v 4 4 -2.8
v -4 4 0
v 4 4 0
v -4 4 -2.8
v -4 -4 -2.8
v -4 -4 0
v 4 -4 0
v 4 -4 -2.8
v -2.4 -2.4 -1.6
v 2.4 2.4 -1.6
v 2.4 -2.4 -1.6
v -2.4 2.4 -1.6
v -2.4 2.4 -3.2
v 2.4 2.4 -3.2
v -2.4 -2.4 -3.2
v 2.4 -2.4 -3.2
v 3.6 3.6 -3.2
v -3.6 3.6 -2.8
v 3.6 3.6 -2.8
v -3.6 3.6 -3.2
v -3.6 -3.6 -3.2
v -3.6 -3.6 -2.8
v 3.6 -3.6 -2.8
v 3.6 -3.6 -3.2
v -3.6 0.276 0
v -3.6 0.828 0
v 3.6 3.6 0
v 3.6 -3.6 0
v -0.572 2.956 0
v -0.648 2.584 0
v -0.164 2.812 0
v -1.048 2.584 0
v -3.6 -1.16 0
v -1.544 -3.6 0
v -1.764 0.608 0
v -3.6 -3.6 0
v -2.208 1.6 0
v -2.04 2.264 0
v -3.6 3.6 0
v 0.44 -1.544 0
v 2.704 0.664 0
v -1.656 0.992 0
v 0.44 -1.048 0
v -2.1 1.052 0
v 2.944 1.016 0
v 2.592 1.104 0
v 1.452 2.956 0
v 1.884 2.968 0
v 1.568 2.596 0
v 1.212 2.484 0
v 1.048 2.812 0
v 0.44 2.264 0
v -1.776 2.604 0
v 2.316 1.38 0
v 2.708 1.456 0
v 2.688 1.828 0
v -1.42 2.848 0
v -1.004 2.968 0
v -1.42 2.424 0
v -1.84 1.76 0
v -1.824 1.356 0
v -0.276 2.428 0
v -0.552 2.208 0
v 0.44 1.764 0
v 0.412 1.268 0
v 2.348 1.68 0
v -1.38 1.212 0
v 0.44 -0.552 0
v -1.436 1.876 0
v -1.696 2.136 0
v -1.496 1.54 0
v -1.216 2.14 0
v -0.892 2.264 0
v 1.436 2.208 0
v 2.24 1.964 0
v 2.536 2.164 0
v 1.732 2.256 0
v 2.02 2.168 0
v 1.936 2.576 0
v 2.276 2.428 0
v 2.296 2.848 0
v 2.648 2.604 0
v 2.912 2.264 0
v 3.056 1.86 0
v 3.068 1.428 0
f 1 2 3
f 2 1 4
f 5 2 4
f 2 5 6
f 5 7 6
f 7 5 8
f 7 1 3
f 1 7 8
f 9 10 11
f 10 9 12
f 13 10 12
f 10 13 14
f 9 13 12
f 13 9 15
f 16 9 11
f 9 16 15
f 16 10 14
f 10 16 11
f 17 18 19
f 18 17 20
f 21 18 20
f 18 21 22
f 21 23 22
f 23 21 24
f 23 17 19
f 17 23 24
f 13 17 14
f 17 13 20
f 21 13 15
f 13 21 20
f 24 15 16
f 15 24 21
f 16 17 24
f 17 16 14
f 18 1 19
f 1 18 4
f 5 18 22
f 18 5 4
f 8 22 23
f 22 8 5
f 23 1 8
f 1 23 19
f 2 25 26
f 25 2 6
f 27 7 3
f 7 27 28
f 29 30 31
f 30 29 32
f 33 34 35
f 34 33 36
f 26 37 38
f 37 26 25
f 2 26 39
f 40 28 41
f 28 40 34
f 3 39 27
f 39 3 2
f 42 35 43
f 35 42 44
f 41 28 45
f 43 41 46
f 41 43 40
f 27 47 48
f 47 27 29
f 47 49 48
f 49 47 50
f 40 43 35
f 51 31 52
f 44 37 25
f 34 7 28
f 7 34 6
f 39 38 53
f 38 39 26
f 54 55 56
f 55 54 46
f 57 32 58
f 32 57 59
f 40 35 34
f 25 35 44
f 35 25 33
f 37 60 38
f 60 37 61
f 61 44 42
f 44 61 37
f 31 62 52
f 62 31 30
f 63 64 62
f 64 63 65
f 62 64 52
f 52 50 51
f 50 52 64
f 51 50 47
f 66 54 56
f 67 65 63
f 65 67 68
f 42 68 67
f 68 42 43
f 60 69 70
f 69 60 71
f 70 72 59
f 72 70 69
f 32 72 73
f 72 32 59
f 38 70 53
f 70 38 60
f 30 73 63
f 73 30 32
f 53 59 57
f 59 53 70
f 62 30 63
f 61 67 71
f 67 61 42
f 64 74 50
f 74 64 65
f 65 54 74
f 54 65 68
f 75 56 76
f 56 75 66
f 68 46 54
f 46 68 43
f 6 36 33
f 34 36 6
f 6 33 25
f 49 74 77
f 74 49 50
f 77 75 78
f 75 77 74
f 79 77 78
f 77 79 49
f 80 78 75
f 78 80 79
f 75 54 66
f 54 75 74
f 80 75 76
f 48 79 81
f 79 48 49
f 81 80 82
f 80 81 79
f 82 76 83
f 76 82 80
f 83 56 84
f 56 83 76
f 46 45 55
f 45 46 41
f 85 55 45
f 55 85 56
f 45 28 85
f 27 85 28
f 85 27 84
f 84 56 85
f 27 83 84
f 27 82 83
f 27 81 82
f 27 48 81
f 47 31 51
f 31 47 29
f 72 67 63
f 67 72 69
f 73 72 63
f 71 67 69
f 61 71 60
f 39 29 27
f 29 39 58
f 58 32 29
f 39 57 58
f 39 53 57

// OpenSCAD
// file: ../p/box5.scad
use <../lib.scad>
function ldraw_lib__box5() = [
// 0 Box with 5 Faces and All Edges
// 0 Name: box5.dat
// 0 Author: James Jessiman
// 0 !LDRAW_ORG Primitive UPDATE 2012-01
// 0 !LICENSE Licensed under CC BY 2.0 and CC BY 4.0 : see CAreadme.txt
// 
// 0 BFC CERTIFY CCW
  [0,"BFC","CERTIFY"],
  [0,"BFC","CCW"],
// 
// 0 !HISTORY 2002-04-03 [sbliss] Modified for BFC compliance
// 0 !HISTORY 2002-04-25 [PTadmin] Official Update 2002-02
// 0 !HISTORY 2007-06-24 [PTadmin] Header formatted for Contributor Agreement
// 0 !HISTORY 2008-07-01 [PTadmin] Official Update 2008-01
// 0 !HISTORY 2012-02-16 [Philo] Changed to CCW
// 0 !HISTORY 2012-03-30 [PTadmin] Official Update 2012-01
// 
// 
// 2 24 1 1 1 -1 1 1
  [2,24,1,1,1,-1,1,1],
// 2 24 -1 1 1 -1 1 -1
  [2,24,-1,1,1,-1,1,-1],
// 2 24 -1 1 -1 1 1 -1
  [2,24,-1,1,-1,1,1,-1],
// 2 24 1 1 -1 1 1 1
  [2,24,1,1,-1,1,1,1],
// 2 24 1 0 1 -1 0 1
  [2,24,1,0,1,-1,0,1],
// 2 24 -1 0 1 -1 0 -1
  [2,24,-1,0,1,-1,0,-1],
// 2 24 -1 0 -1 1 0 -1
  [2,24,-1,0,-1,1,0,-1],
// 2 24 1 0 -1 1 0 1
  [2,24,1,0,-1,1,0,1],
// 2 24 1 0 1 1 1 1
  [2,24,1,0,1,1,1,1],
// 2 24 -1 0 1 -1 1 1
  [2,24,-1,0,1,-1,1,1],
// 2 24 1 0 -1 1 1 -1
  [2,24,1,0,-1,1,1,-1],
// 2 24 -1 0 -1 -1 1 -1
  [2,24,-1,0,-1,-1,1,-1],
// 4 16 -1 1 1 1 1 1 1 1 -1 -1 1 -1
  [4,16,-1,1,1,1,1,1,1,1,-1,-1,1,-1],
// 4 16 -1 1 1 -1 0 1 1 0 1 1 1 1
  [4,16,-1,1,1,-1,0,1,1,0,1,1,1,1],
// 4 16 -1 1 -1 -1 0 -1 -1 0 1 -1 1 1
  [4,16,-1,1,-1,-1,0,-1,-1,0,1,-1,1,1],
// 4 16 1 1 -1 1 0 -1 -1 0 -1 -1 1 -1
  [4,16,1,1,-1,1,0,-1,-1,0,-1,-1,1,-1],
// 4 16 1 1 1 1 0 1 1 0 -1 1 1 -1
  [4,16,1,1,1,1,0,1,1,0,-1,1,1,-1],
];
module ldraw_lib__box5(step=0, col=false, unit=2/5, alt=false, line=0.2, solid=!$preview)
    makepoly(ldraw_lib__box5(), step=step, col=col, unit=unit, alt=alt, line=line, solid=solid);
ldraw_lib__box5(line=0.2);
// file: ../p/box4.scad
use <../lib.scad>
function ldraw_lib__box4() = [
// 0 Box with 4 Faces (2 Parallel Pairs) and All Edges
// 0 Name: box4.dat
// 0 Author: James Jessiman
// 0 !LDRAW_ORG Primitive UPDATE 2012-01
// 0 !LICENSE Licensed under CC BY 2.0 and CC BY 4.0 : see CAreadme.txt
// 
// 0 BFC CERTIFY CCW
  [0,"BFC","CERTIFY"],
  [0,"BFC","CCW"],
// 
// 0 !HISTORY 2002-04-03 [sbliss] Modified for BFC compliance
// 0 !HISTORY 2002-04-25 [PTadmin] Official Update 2002-02
// 0 !HISTORY 2007-06-24 [PTadmin] Header formatted for Contributor Agreement
// 0 !HISTORY 2008-07-01 [PTadmin] Official Update 2008-01
// 0 !HISTORY 2012-02-16 [Philo] Changed to CCW
// 0 !HISTORY 2012-03-30 [PTadmin] Official Update 2012-01
// 
// 
// 2 24 1 1 1 -1 1 1
  [2,24,1,1,1,-1,1,1],
// 2 24 -1 1 1 -1 1 -1
  [2,24,-1,1,1,-1,1,-1],
// 2 24 -1 1 -1 1 1 -1
  [2,24,-1,1,-1,1,1,-1],
// 2 24 1 1 -1 1 1 1
  [2,24,1,1,-1,1,1,1],
// 2 24 1 0 1 -1 0 1
  [2,24,1,0,1,-1,0,1],
// 2 24 -1 0 1 -1 0 -1
  [2,24,-1,0,1,-1,0,-1],
// 2 24 -1 0 -1 1 0 -1
  [2,24,-1,0,-1,1,0,-1],
// 2 24 1 0 -1 1 0 1
  [2,24,1,0,-1,1,0,1],
// 2 24 1 0 1 1 1 1
  [2,24,1,0,1,1,1,1],
// 2 24 -1 0 1 -1 1 1
  [2,24,-1,0,1,-1,1,1],
// 2 24 1 0 -1 1 1 -1
  [2,24,1,0,-1,1,1,-1],
// 2 24 -1 0 -1 -1 1 -1
  [2,24,-1,0,-1,-1,1,-1],
// 4 16 -1 1 1 -1 0 1 1 0 1 1 1 1
  [4,16,-1,1,1,-1,0,1,1,0,1,1,1,1],
// 4 16 -1 1 -1 -1 0 -1 -1 0 1 -1 1 1
  [4,16,-1,1,-1,-1,0,-1,-1,0,1,-1,1,1],
// 4 16 1 1 -1 1 0 -1 -1 0 -1 -1 1 -1
  [4,16,1,1,-1,1,0,-1,-1,0,-1,-1,1,-1],
// 4 16 1 1 1 1 0 1 1 0 -1 1 1 -1
  [4,16,1,1,1,1,0,1,1,0,-1,1,1,-1],
];
module ldraw_lib__box4(step=0, col=false, unit=2/5, alt=false, line=0.2, solid=!$preview)
    makepoly(ldraw_lib__box4(), step=step, col=col, unit=unit, alt=alt, line=line, solid=solid);
ldraw_lib__box4(line=0.2);
// file: s/3070bs01.scad
use <../../lib.scad>
use <../../p/box4.scad>
use <../../p/box5.scad>
function ldraw_lib__s__3070bs01() = [
// 0 ~Tile  1 x  1 with Groove without Top Face
// 0 Name: s\3070bs01.dat
// 0 Author: Chris Dee [cwdee]
// 0 !LDRAW_ORG Subpart UPDATE 2009-02
// 0 !LICENSE Licensed under CC BY 2.0 and CC BY 4.0 : see CAreadme.txt
// 
// 0 BFC CERTIFY CCW
  [0,"BFC","CERTIFY"],
  [0,"BFC","CCW"],
// 
// 0 !HISTORY 2009-09-03 [PTadmin] Official Update 2009-02
// 
// 
// 1 16 0 0 0 10 0 0 0 7 0 0 0 10 box4.dat
  [1,16,0,0,0,10,0,0,0,7,0,0,0,10, ldraw_lib__box4()],
// 0 BFC INVERTNEXT
  [0,"BFC","INVERTNEXT"],
// 1 16 0 8 0 6 0 0 0 -4 0 0 0 6 box5.dat
  [1,16,0,8,0,6,0,0,0,-4,0,0,0,6, ldraw_lib__box5()],
// 1 16 0 7 0 9 0 0 0 1 0 0 0 9 box4.dat
  [1,16,0,7,0,9,0,0,0,1,0,0,0,9, ldraw_lib__box4()],
// 
// 4 16 9 8 9 6 8 6 -6 8 6 -9 8 9
  [4,16,9,8,9,6,8,6,-6,8,6,-9,8,9],
// 4 16 -9 8 9 -6 8 6 -6 8 -6 -9 8 -9
  [4,16,-9,8,9,-6,8,6,-6,8,-6,-9,8,-9],
// 4 16 -9 8 -9 -6 8 -6 6 8 -6 9 8 -9
  [4,16,-9,8,-9,-6,8,-6,6,8,-6,9,8,-9],
// 4 16 9 8 -9 6 8 -6 6 8 6 9 8 9
  [4,16,9,8,-9,6,8,-6,6,8,6,9,8,9],
// 
// 4 16 10 7 10 9 7 9 -9 7 9 -10 7 10
  [4,16,10,7,10,9,7,9,-9,7,9,-10,7,10],
// 4 16 -10 7 10 -9 7 9 -9 7 -9 -10 7 -10
  [4,16,-10,7,10,-9,7,9,-9,7,-9,-10,7,-10],
// 4 16 -10 7 -10 -9 7 -9 9 7 -9 10 7 -10
  [4,16,-10,7,-10,-9,7,-9,9,7,-9,10,7,-10],
// 4 16 10 7 -10 9 7 -9 9 7 9 10 7 10
  [4,16,10,7,-10,9,7,-9,9,7,9,10,7,10],
// 0
];
module ldraw_lib__s__3070bs01(step=0, col=false, unit=2/5, alt=false, line=0.2, solid=!$preview)
    makepoly(ldraw_lib__s__3070bs01(), step=step, col=col, unit=unit, alt=alt, line=line, solid=solid);
ldraw_lib__s__3070bs01(line=0.2);
// main file
use <../lib.scad>
use <s/3070bs01.scad>
function ldraw_lib__3070bp0r() = [
// 0 Tile  1 x  1 with Magenta Heart Frame on Yellow Background Pattern
// 0 Name: 3070bp0r.dat
// 0 Author: Philippe Hurbain [Philo]
// 0 !LDRAW_ORG Part UPDATE 2020-03
// 0 !LICENSE Licensed under CC BY 2.0 and CC BY 4.0 : see CAreadme.txt
// 
// 0 BFC CERTIFY CCW
  [0,"BFC","CERTIFY"],
  [0,"BFC","CCW"],
// 
// 0 !KEYWORDS Bricklink 3070bpb159, Dots, Set 41916
// 
// 0 !HISTORY 2020-12-29 [PTadmin] Official Update 2020-03
// 
// 
// 1 16 0 0 0 1 0 0 0 1 0 0 0 1 s\3070bs01.dat
  [1,16,0,0,0,1,0,0,0,1,0,0,0,1, ldraw_lib__s__3070bs01()],
// 4 16 -10 0 10 -10 0 -10 -9 0 0.69 -9 0 2.07
  [4,16,-10,0,10,-10,0,-10,-9,0,0.69,-9,0,2.07],
// 4 16 9 0 9 9 0 -9 10 0 -10 10 0 10
  [4,16,9,0,9,9,0,-9,10,0,-10,10,0,10],
// 4 26 -0.41 0 7.03 -1.43 0 7.39 -2.62 0 6.46 -1.62 0 6.46
  [4,26,-0.41,0,7.03,-1.43,0,7.39,-2.62,0,6.46,-1.62,0,6.46],
// 4 353 -4.41 0 1.52 -9 0 -2.9 -9 0 -9 -3.86 0 -9
  [4,353,-4.41,0,1.52,-9,0,-2.9,-9,0,-9,-3.86,0,-9],
// 4 353 -5.52 0 4 -5.1 0 5.66 -9 0 2.07 -9 0 0.69
  [4,353,-5.52,0,4,-5.1,0,5.66,-9,0,2.07,-9,0,0.69],
// 3 16 -10 0 10 -9 0 2.07 -9 0 9
  [3,16,-10,0,10,-9,0,2.07,-9,0,9],
// 4 14 9 0 -9 6.76 0 1.66 1.1 0 -3.86 -3.86 0 -9
  [4,14,9,0,-9,6.76,0,1.66,1.1,0,-3.86,-3.86,0,-9],
// 4 16 -9 0 9 9 0 9 10 0 10 -10 0 10
  [4,16,-9,0,9,9,0,9,10,0,10,-10,0,10],
// 4 26 -4.14 0 2.48 -5.25 0 2.63 -4.41 0 1.52 1.1 0 -2.62
  [4,26,-4.14,0,2.48,-5.25,0,2.63,-4.41,0,1.52,1.1,0,-2.62],
// 3 14 6.76 0 1.66 9 0 -9 7.36 0 2.54
  [3,14,6.76,0,1.66,9,0,-9,7.36,0,2.54],
// 4 26 6.48 0 2.76 1.1 0 -2.62 1.1 0 -3.86 6.76 0 1.66
  [4,26,6.48,0,2.76,1.1,0,-2.62,1.1,0,-3.86,6.76,0,1.66],
// 4 14 3.63 0 7.39 4.71 0 7.42 9 0 9 -1.43 0 7.39
  [4,14,3.63,0,7.39,4.71,0,7.42,9,0,9,-1.43,0,7.39],
// 4 26 3.92 0 6.49 4.71 0 7.42 3.63 0 7.39 3.03 0 6.21
  [4,26,3.92,0,6.49,4.71,0,7.42,3.63,0,7.39,3.03,0,6.21],
// 3 26 1.1 0 -3.86 1.1 0 -2.62 -4.41 0 1.52
  [3,26,1.1,0,-3.86,1.1,0,-2.62,-4.41,0,1.52],
// 3 14 2.62 0 7.03 -0.41 0 7.03 1.1 0 5.66
  [3,14,2.62,0,7.03,-0.41,0,7.03,1.1,0,5.66],
// 3 16 -5.25 0 2.63 -5.52 0 4 -9 0 0.69
  [3,16,-5.25,0,2.63,-5.52,0,4,-9,0,0.69],
// 4 16 -3.86 0 -9 -10 0 -10 10 0 -10 9 0 -9
  [4,16,-3.86,0,-9,-10,0,-10,10,0,-10,9,0,-9],
// 4 14 -9 0 9 -9 0 2.07 -5.1 0 5.66 -4.44 0 6.51
  [4,14,-9,0,9,-9,0,2.07,-5.1,0,5.66,-4.44,0,6.51],
// 4 29 6.48 0 2.76 6.77 0 3.64 6.72 0 4.57 5.79 0 3.45
  [4,29,6.48,0,2.76,6.77,0,3.64,6.72,0,4.57,5.79,0,3.45],
// 4 26 -3.55 0 7.12 -3.55 0 6.06 -2.62 0 6.46 -2.51 0 7.42
  [4,26,-3.55,0,7.12,-3.55,0,6.06,-2.62,0,6.46,-2.51,0,7.42],
// 3 353 1.1 0 -3.86 -4.41 0 1.52 -3.86 0 -9
  [3,353,1.1,0,-3.86,-4.41,0,1.52,-3.86,0,-9],
// 4 16 -4.41 0 1.52 -5.25 0 2.63 -9 0 0.69 -9 0 -2.9
  [4,16,-4.41,0,1.52,-5.25,0,2.63,-9,0,0.69,-9,0,-2.9],
// 4 26 -4.6 0 4.4 -5.1 0 5.66 -5.52 0 4 -4.56 0 3.39
  [4,26,-4.6,0,4.4,-5.1,0,5.66,-5.52,0,4,-4.56,0,3.39],
// 4 26 -4.56 0 3.39 -5.52 0 4 -5.25 0 2.63 -4.14 0 2.48
  [4,26,-4.56,0,3.39,-5.52,0,4,-5.25,0,2.63,-4.14,0,2.48],
// 4 26 -0.69 0 6.07 1.1 0 5.66 -0.41 0 7.03 -1.62 0 6.46
  [4,26,-0.69,0,6.07,1.1,0,5.66,-0.41,0,7.03,-1.62,0,6.46],
// 4 29 -1.38 0 5.52 1.03 0 3.17 1.1 0 4.41 -0.69 0 6.07
  [4,29,-1.38,0,5.52,1.03,0,3.17,1.1,0,4.41,-0.69,0,6.07],
// 3 26 -0.69 0 6.07 1.1 0 4.41 1.1 0 5.66
  [3,26,-0.69,0,6.07,1.1,0,4.41,1.1,0,5.66],
// 4 26 3.03 0 6.21 2.62 0 7.03 1.1 0 5.66 1.1 0 4.41
  [4,26,3.03,0,6.21,2.62,0,7.03,1.1,0,5.66,1.1,0,4.41],
// 3 26 2.62 0 7.03 3.03 0 6.21 3.63 0 7.39
  [3,26,2.62,0,7.03,3.03,0,6.21,3.63,0,7.39],
// 3 29 5.87 0 4.2 5.79 0 3.45 6.72 0 4.57
  [3,29,5.87,0,4.2,5.79,0,3.45,6.72,0,4.57],
// 4 16 -3.45 0 3.03 1.1 0 -1.38 1.03 0 3.17 -1.38 0 5.52
  [4,16,-3.45,0,3.03,1.1,0,-1.38,1.03,0,3.17,-1.38,0,5.52],
// 4 29 -4.14 0 2.48 1.1 0 -2.62 1.1 0 -1.38 -3.45 0 3.03
  [4,29,-4.14,0,2.48,1.1,0,-2.62,1.1,0,-1.38,-3.45,0,3.03],
// 4 29 -4.6 0 4.4 -3.74 0 3.85 -3.59 0 4.69 -4.24 0 5.34
  [4,29,-4.6,0,4.4,-3.74,0,3.85,-3.59,0,4.69,-4.24,0,5.34],
// 4 29 -4.24 0 5.34 -3.59 0 4.69 -3.04 0 5.35 -3.55 0 6.06
  [4,29,-4.24,0,5.34,-3.59,0,4.69,-3.04,0,5.35,-3.55,0,6.06],
// 4 29 -2.62 0 6.46 -3.55 0 6.06 -3.04 0 5.35 -2.23 0 5.66
  [4,29,-2.62,0,6.46,-3.55,0,6.06,-3.04,0,5.35,-2.23,0,5.66],
// 4 26 -5.1 0 5.66 -4.6 0 4.4 -4.24 0 5.34 -4.44 0 6.51
  [4,26,-5.1,0,5.66,-4.6,0,4.4,-4.24,0,5.34,-4.44,0,6.51],
// 4 29 -1.62 0 6.46 -2.62 0 6.46 -2.23 0 5.66 -1.38 0 5.52
  [4,29,-1.62,0,6.46,-2.62,0,6.46,-2.23,0,5.66,-1.38,0,5.52],
// 4 26 -4.44 0 6.51 -4.24 0 5.34 -3.55 0 6.06 -3.55 0 7.12
  [4,26,-4.44,0,6.51,-4.24,0,5.34,-3.55,0,6.06,-3.55,0,7.12],
// 3 29 -0.69 0 6.07 -1.62 0 6.46 -1.38 0 5.52
  [3,29,-0.69,0,6.07,-1.62,0,6.46,-1.38,0,5.52],
// 4 29 -3.45 0 3.03 -3.74 0 3.85 -4.56 0 3.39 -4.14 0 2.48
  [4,29,-3.45,0,3.03,-3.74,0,3.85,-4.56,0,3.39,-4.14,0,2.48],
// 4 29 3.59 0 5.52 3.03 0 6.21 1.1 0 4.41 1.03 0 3.17
  [4,29,3.59,0,5.52,3.03,0,6.21,1.1,0,4.41,1.03,0,3.17],
// 4 16 5.79 0 3.45 3.59 0 5.52 1.03 0 3.17 1.1 0 -1.38
  [4,16,5.79,0,3.45,3.59,0,5.52,1.03,0,3.17,1.1,0,-1.38],
// 4 29 5.6 0 4.91 5.87 0 4.2 6.72 0 4.57 6.34 0 5.41
  [4,29,5.6,0,4.91,5.87,0,4.2,6.72,0,4.57,6.34,0,5.41],
// 4 29 1.1 0 -1.38 1.1 0 -2.62 6.48 0 2.76 5.79 0 3.45
  [4,29,1.1,0,-1.38,1.1,0,-2.62,6.48,0,2.76,5.79,0,3.45],
// 3 16 -10 0 -10 -9 0 -9 -9 0 -2.9
  [3,16,-10,0,-10,-9,0,-9,-9,0,-2.9],
// 3 16 -3.86 0 -9 -9 0 -9 -10 0 -10
  [3,16,-3.86,0,-9,-9,0,-9,-10,0,-10],
// 3 16 -10 0 -10 -9 0 -2.9 -9 0 0.69
  [3,16,-10,0,-10,-9,0,-2.9,-9,0,0.69],
// 4 29 3.03 0 6.21 3.59 0 5.52 4.33 0 5.64 3.92 0 6.49
  [4,29,3.03,0,6.21,3.59,0,5.52,4.33,0,5.64,3.92,0,6.49],
// 4 16 5.05 0 5.42 4.33 0 5.64 3.59 0 5.52 5.6 0 4.91
  [4,16,5.05,0,5.42,4.33,0,5.64,3.59,0,5.52,5.6,0,4.91],
// 4 29 4.84 0 6.44 3.92 0 6.49 4.33 0 5.64 5.05 0 5.42
  [4,29,4.84,0,6.44,3.92,0,6.49,4.33,0,5.64,5.05,0,5.42],
// 4 29 5.69 0 6.07 4.84 0 6.44 5.05 0 5.42 5.6 0 4.91
  [4,29,5.69,0,6.07,4.84,0,6.44,5.05,0,5.42,5.6,0,4.91],
// 4 16 5.6 0 4.91 3.59 0 5.52 5.79 0 3.45 5.87 0 4.2
  [4,16,5.6,0,4.91,3.59,0,5.52,5.79,0,3.45,5.87,0,4.2],
// 3 29 5.69 0 6.07 5.6 0 4.91 6.34 0 5.41
  [3,29,5.69,0,6.07,5.6,0,4.91,6.34,0,5.41],
// 4 26 4.71 0 7.42 3.92 0 6.49 4.84 0 6.44 5.74 0 7.12
  [4,26,4.71,0,7.42,3.92,0,6.49,4.84,0,6.44,5.74,0,7.12],
// 4 26 5.74 0 7.12 4.84 0 6.44 5.69 0 6.07 6.62 0 6.51
  [4,26,5.74,0,7.12,4.84,0,6.44,5.69,0,6.07,6.62,0,6.51],
// 4 26 6.62 0 6.51 5.69 0 6.07 6.34 0 5.41 7.28 0 5.66
  [4,26,6.62,0,6.51,5.69,0,6.07,6.34,0,5.41,7.28,0,5.66],
// 4 26 7.28 0 5.66 6.34 0 5.41 6.72 0 4.57 7.64 0 4.65
  [4,26,7.28,0,5.66,6.34,0,5.41,6.72,0,4.57,7.64,0,4.65],
// 4 26 7.36 0 2.54 6.77 0 3.64 6.48 0 2.76 6.76 0 1.66
  [4,26,7.36,0,2.54,6.77,0,3.64,6.48,0,2.76,6.76,0,1.66],
// 4 26 6.72 0 4.57 6.77 0 3.64 7.36 0 2.54 7.67 0 3.57
  [4,26,6.72,0,4.57,6.77,0,3.64,7.36,0,2.54,7.67,0,3.57],
// 3 14 7.36 0 2.54 9 0 -9 7.67 0 3.57
  [3,14,7.36,0,2.54,9,0,-9,7.67,0,3.57],
// 4 14 7.67 0 3.57 9 0 -9 9 0 9 7.64 0 4.65
  [4,14,7.67,0,3.57,9,0,-9,9,0,9,7.64,0,4.65],
// 3 26 7.64 0 4.65 6.72 0 4.57 7.67 0 3.57
  [3,26,7.64,0,4.65,6.72,0,4.57,7.67,0,3.57],
// 3 14 9 0 9 7.28 0 5.66 7.64 0 4.65
  [3,14,9,0,9,7.28,0,5.66,7.64,0,4.65],
// 3 14 9 0 9 6.62 0 6.51 7.28 0 5.66
  [3,14,9,0,9,6.62,0,6.51,7.28,0,5.66],
// 3 14 9 0 9 5.74 0 7.12 6.62 0 6.51
  [3,14,9,0,9,5.74,0,7.12,6.62,0,6.51],
// 3 14 9 0 9 4.71 0 7.42 5.74 0 7.12
  [3,14,9,0,9,4.71,0,7.42,5.74,0,7.12],
// 4 14 -0.41 0 7.03 2.62 0 7.03 3.63 0 7.39 -1.43 0 7.39
  [4,14,-0.41,0,7.03,2.62,0,7.03,3.63,0,7.39,-1.43,0,7.39],
// 4 16 -3.59 0 4.69 -3.45 0 3.03 -1.38 0 5.52 -3.04 0 5.35
  [4,16,-3.59,0,4.69,-3.45,0,3.03,-1.38,0,5.52,-3.04,0,5.35],
// 3 16 -2.23 0 5.66 -3.04 0 5.35 -1.38 0 5.52
  [3,16,-2.23,0,5.66,-3.04,0,5.35,-1.38,0,5.52],
// 3 16 -3.74 0 3.85 -3.45 0 3.03 -3.59 0 4.69
  [3,16,-3.74,0,3.85,-3.45,0,3.03,-3.59,0,4.69],
// 3 29 -4.56 0 3.39 -3.74 0 3.85 -4.6 0 4.4
  [3,29,-4.56,0,3.39,-3.74,0,3.85,-4.6,0,4.4],
// 4 14 -1.43 0 7.39 9 0 9 -9 0 9 -2.51 0 7.42
  [4,14,-1.43,0,7.39,9,0,9,-9,0,9,-2.51,0,7.42],
// 3 26 -2.51 0 7.42 -2.62 0 6.46 -1.43 0 7.39
  [3,26,-2.51,0,7.42,-2.62,0,6.46,-1.43,0,7.39],
// 3 14 -9 0 9 -3.55 0 7.12 -2.51 0 7.42
  [3,14,-9,0,9,-3.55,0,7.12,-2.51,0,7.42],
// 3 14 -9 0 9 -4.44 0 6.51 -3.55 0 7.12
  [3,14,-9,0,9,-4.44,0,6.51,-3.55,0,7.12],
];
module ldraw_lib__3070bp0r(step=0, col=false, unit=2/5, alt=false, line=0.2, solid=!$preview)
    makepoly(ldraw_lib__3070bp0r(), step=step, col=col, unit=unit, alt=alt, line=line, solid=solid);
ldraw_lib__3070bp0r(line=0.2);
